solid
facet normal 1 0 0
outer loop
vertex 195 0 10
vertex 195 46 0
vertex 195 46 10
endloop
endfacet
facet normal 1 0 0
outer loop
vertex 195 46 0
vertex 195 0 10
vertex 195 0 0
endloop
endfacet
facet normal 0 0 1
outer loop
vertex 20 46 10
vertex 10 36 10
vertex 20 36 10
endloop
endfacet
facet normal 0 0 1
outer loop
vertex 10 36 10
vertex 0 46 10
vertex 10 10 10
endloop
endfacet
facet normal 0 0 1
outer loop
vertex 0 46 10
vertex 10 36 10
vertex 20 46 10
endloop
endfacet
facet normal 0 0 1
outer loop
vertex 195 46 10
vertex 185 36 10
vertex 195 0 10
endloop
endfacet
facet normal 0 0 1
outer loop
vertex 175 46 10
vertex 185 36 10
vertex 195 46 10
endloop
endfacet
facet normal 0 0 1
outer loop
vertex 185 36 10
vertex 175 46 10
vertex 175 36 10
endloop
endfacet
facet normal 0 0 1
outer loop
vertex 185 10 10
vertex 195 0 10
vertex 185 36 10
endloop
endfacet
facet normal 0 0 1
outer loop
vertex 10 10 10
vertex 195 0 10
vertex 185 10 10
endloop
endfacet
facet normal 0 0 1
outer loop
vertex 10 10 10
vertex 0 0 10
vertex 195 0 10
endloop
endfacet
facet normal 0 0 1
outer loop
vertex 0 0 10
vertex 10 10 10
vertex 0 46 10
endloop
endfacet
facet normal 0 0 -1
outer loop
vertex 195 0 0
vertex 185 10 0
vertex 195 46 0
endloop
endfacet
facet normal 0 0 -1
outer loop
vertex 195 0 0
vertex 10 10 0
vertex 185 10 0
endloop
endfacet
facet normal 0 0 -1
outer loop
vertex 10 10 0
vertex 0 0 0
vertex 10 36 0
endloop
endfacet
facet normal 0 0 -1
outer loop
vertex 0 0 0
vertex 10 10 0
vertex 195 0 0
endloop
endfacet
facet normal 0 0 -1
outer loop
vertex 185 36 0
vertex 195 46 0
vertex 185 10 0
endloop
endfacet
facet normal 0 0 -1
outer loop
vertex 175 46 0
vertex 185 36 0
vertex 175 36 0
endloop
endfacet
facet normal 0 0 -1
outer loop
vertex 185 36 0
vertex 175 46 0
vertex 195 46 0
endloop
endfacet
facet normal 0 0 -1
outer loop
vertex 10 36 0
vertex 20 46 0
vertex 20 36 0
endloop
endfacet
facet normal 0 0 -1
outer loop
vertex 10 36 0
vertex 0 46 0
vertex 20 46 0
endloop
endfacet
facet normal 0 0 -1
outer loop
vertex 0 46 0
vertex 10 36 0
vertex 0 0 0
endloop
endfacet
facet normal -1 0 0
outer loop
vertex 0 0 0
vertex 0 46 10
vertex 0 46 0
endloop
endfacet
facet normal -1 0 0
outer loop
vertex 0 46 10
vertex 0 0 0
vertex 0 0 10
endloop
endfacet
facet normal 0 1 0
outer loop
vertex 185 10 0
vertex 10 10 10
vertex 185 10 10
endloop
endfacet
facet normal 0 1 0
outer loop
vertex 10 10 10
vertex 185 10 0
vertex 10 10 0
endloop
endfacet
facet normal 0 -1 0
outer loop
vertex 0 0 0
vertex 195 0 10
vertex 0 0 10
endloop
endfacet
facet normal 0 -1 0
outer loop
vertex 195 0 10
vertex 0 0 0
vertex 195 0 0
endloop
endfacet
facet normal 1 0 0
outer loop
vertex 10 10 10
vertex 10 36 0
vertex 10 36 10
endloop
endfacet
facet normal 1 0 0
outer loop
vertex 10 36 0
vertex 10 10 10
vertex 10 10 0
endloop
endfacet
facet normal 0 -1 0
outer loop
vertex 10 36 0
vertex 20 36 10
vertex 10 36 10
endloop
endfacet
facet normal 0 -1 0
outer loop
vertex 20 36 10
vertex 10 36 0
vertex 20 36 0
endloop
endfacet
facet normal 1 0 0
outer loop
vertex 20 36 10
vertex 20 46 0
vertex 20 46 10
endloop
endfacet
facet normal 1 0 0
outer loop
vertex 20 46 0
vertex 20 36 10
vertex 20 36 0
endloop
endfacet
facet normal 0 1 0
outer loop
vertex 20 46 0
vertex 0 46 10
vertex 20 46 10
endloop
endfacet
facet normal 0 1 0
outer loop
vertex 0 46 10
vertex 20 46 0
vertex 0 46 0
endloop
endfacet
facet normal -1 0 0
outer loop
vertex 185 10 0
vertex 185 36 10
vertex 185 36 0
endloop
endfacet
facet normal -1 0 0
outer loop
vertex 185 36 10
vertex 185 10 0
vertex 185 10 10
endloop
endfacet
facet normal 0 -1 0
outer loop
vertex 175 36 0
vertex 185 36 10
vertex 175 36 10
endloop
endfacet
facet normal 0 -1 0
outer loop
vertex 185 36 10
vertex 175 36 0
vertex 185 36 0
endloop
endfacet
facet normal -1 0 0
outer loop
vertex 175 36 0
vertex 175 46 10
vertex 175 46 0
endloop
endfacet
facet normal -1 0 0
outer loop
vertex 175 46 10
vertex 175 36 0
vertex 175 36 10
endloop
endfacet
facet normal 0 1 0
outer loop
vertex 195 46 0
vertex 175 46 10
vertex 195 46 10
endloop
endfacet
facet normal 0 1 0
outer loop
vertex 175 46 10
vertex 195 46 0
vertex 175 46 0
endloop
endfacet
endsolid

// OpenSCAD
//
//
//			Ladder Light bracket
//
//			slips over step ladder to hold trouble light
//			or flash light
//
//
//			R. Lazure 		June 2019
//
//
length = 175; // [160:1:200]
width = 26; // [20:1:40]
//

/* [Hidden] */
bar_width = 10;
bar_height = 10;
tab_length = 10; 
$fn=60;
//
//
union () {

//
// long bar
//
color("pink")
translate([0,0,0]) rotate([0,0,0]) 
	cube(size = [length+2*bar_width, bar_width, bar_height], center = false); 
//
//  left side bar
//
color("red")
translate([bar_width,bar_width,0]) rotate([0,0,90]) 
	cube(size = [width, bar_width, bar_height], center = false); 
//
//  tab
//
color("green")
translate([0,width+bar_width,0]) rotate([0,0,0]) 
	cube(size = [bar_width+tab_length, bar_width, bar_height], center = false); 
//
//  right side bar
//
color("red")
translate([length+2*bar_width,bar_width,0]) rotate([0,0,90]) 
	cube(size = [width, bar_width, bar_height], center = false); 
//
//  tab
//
color("green")
translate([length+bar_width-tab_length,width+bar_width,0]) rotate([0,0,0]) 
	cube(size = [tab_length+bar_width, bar_width, bar_height], center = false);

} 
